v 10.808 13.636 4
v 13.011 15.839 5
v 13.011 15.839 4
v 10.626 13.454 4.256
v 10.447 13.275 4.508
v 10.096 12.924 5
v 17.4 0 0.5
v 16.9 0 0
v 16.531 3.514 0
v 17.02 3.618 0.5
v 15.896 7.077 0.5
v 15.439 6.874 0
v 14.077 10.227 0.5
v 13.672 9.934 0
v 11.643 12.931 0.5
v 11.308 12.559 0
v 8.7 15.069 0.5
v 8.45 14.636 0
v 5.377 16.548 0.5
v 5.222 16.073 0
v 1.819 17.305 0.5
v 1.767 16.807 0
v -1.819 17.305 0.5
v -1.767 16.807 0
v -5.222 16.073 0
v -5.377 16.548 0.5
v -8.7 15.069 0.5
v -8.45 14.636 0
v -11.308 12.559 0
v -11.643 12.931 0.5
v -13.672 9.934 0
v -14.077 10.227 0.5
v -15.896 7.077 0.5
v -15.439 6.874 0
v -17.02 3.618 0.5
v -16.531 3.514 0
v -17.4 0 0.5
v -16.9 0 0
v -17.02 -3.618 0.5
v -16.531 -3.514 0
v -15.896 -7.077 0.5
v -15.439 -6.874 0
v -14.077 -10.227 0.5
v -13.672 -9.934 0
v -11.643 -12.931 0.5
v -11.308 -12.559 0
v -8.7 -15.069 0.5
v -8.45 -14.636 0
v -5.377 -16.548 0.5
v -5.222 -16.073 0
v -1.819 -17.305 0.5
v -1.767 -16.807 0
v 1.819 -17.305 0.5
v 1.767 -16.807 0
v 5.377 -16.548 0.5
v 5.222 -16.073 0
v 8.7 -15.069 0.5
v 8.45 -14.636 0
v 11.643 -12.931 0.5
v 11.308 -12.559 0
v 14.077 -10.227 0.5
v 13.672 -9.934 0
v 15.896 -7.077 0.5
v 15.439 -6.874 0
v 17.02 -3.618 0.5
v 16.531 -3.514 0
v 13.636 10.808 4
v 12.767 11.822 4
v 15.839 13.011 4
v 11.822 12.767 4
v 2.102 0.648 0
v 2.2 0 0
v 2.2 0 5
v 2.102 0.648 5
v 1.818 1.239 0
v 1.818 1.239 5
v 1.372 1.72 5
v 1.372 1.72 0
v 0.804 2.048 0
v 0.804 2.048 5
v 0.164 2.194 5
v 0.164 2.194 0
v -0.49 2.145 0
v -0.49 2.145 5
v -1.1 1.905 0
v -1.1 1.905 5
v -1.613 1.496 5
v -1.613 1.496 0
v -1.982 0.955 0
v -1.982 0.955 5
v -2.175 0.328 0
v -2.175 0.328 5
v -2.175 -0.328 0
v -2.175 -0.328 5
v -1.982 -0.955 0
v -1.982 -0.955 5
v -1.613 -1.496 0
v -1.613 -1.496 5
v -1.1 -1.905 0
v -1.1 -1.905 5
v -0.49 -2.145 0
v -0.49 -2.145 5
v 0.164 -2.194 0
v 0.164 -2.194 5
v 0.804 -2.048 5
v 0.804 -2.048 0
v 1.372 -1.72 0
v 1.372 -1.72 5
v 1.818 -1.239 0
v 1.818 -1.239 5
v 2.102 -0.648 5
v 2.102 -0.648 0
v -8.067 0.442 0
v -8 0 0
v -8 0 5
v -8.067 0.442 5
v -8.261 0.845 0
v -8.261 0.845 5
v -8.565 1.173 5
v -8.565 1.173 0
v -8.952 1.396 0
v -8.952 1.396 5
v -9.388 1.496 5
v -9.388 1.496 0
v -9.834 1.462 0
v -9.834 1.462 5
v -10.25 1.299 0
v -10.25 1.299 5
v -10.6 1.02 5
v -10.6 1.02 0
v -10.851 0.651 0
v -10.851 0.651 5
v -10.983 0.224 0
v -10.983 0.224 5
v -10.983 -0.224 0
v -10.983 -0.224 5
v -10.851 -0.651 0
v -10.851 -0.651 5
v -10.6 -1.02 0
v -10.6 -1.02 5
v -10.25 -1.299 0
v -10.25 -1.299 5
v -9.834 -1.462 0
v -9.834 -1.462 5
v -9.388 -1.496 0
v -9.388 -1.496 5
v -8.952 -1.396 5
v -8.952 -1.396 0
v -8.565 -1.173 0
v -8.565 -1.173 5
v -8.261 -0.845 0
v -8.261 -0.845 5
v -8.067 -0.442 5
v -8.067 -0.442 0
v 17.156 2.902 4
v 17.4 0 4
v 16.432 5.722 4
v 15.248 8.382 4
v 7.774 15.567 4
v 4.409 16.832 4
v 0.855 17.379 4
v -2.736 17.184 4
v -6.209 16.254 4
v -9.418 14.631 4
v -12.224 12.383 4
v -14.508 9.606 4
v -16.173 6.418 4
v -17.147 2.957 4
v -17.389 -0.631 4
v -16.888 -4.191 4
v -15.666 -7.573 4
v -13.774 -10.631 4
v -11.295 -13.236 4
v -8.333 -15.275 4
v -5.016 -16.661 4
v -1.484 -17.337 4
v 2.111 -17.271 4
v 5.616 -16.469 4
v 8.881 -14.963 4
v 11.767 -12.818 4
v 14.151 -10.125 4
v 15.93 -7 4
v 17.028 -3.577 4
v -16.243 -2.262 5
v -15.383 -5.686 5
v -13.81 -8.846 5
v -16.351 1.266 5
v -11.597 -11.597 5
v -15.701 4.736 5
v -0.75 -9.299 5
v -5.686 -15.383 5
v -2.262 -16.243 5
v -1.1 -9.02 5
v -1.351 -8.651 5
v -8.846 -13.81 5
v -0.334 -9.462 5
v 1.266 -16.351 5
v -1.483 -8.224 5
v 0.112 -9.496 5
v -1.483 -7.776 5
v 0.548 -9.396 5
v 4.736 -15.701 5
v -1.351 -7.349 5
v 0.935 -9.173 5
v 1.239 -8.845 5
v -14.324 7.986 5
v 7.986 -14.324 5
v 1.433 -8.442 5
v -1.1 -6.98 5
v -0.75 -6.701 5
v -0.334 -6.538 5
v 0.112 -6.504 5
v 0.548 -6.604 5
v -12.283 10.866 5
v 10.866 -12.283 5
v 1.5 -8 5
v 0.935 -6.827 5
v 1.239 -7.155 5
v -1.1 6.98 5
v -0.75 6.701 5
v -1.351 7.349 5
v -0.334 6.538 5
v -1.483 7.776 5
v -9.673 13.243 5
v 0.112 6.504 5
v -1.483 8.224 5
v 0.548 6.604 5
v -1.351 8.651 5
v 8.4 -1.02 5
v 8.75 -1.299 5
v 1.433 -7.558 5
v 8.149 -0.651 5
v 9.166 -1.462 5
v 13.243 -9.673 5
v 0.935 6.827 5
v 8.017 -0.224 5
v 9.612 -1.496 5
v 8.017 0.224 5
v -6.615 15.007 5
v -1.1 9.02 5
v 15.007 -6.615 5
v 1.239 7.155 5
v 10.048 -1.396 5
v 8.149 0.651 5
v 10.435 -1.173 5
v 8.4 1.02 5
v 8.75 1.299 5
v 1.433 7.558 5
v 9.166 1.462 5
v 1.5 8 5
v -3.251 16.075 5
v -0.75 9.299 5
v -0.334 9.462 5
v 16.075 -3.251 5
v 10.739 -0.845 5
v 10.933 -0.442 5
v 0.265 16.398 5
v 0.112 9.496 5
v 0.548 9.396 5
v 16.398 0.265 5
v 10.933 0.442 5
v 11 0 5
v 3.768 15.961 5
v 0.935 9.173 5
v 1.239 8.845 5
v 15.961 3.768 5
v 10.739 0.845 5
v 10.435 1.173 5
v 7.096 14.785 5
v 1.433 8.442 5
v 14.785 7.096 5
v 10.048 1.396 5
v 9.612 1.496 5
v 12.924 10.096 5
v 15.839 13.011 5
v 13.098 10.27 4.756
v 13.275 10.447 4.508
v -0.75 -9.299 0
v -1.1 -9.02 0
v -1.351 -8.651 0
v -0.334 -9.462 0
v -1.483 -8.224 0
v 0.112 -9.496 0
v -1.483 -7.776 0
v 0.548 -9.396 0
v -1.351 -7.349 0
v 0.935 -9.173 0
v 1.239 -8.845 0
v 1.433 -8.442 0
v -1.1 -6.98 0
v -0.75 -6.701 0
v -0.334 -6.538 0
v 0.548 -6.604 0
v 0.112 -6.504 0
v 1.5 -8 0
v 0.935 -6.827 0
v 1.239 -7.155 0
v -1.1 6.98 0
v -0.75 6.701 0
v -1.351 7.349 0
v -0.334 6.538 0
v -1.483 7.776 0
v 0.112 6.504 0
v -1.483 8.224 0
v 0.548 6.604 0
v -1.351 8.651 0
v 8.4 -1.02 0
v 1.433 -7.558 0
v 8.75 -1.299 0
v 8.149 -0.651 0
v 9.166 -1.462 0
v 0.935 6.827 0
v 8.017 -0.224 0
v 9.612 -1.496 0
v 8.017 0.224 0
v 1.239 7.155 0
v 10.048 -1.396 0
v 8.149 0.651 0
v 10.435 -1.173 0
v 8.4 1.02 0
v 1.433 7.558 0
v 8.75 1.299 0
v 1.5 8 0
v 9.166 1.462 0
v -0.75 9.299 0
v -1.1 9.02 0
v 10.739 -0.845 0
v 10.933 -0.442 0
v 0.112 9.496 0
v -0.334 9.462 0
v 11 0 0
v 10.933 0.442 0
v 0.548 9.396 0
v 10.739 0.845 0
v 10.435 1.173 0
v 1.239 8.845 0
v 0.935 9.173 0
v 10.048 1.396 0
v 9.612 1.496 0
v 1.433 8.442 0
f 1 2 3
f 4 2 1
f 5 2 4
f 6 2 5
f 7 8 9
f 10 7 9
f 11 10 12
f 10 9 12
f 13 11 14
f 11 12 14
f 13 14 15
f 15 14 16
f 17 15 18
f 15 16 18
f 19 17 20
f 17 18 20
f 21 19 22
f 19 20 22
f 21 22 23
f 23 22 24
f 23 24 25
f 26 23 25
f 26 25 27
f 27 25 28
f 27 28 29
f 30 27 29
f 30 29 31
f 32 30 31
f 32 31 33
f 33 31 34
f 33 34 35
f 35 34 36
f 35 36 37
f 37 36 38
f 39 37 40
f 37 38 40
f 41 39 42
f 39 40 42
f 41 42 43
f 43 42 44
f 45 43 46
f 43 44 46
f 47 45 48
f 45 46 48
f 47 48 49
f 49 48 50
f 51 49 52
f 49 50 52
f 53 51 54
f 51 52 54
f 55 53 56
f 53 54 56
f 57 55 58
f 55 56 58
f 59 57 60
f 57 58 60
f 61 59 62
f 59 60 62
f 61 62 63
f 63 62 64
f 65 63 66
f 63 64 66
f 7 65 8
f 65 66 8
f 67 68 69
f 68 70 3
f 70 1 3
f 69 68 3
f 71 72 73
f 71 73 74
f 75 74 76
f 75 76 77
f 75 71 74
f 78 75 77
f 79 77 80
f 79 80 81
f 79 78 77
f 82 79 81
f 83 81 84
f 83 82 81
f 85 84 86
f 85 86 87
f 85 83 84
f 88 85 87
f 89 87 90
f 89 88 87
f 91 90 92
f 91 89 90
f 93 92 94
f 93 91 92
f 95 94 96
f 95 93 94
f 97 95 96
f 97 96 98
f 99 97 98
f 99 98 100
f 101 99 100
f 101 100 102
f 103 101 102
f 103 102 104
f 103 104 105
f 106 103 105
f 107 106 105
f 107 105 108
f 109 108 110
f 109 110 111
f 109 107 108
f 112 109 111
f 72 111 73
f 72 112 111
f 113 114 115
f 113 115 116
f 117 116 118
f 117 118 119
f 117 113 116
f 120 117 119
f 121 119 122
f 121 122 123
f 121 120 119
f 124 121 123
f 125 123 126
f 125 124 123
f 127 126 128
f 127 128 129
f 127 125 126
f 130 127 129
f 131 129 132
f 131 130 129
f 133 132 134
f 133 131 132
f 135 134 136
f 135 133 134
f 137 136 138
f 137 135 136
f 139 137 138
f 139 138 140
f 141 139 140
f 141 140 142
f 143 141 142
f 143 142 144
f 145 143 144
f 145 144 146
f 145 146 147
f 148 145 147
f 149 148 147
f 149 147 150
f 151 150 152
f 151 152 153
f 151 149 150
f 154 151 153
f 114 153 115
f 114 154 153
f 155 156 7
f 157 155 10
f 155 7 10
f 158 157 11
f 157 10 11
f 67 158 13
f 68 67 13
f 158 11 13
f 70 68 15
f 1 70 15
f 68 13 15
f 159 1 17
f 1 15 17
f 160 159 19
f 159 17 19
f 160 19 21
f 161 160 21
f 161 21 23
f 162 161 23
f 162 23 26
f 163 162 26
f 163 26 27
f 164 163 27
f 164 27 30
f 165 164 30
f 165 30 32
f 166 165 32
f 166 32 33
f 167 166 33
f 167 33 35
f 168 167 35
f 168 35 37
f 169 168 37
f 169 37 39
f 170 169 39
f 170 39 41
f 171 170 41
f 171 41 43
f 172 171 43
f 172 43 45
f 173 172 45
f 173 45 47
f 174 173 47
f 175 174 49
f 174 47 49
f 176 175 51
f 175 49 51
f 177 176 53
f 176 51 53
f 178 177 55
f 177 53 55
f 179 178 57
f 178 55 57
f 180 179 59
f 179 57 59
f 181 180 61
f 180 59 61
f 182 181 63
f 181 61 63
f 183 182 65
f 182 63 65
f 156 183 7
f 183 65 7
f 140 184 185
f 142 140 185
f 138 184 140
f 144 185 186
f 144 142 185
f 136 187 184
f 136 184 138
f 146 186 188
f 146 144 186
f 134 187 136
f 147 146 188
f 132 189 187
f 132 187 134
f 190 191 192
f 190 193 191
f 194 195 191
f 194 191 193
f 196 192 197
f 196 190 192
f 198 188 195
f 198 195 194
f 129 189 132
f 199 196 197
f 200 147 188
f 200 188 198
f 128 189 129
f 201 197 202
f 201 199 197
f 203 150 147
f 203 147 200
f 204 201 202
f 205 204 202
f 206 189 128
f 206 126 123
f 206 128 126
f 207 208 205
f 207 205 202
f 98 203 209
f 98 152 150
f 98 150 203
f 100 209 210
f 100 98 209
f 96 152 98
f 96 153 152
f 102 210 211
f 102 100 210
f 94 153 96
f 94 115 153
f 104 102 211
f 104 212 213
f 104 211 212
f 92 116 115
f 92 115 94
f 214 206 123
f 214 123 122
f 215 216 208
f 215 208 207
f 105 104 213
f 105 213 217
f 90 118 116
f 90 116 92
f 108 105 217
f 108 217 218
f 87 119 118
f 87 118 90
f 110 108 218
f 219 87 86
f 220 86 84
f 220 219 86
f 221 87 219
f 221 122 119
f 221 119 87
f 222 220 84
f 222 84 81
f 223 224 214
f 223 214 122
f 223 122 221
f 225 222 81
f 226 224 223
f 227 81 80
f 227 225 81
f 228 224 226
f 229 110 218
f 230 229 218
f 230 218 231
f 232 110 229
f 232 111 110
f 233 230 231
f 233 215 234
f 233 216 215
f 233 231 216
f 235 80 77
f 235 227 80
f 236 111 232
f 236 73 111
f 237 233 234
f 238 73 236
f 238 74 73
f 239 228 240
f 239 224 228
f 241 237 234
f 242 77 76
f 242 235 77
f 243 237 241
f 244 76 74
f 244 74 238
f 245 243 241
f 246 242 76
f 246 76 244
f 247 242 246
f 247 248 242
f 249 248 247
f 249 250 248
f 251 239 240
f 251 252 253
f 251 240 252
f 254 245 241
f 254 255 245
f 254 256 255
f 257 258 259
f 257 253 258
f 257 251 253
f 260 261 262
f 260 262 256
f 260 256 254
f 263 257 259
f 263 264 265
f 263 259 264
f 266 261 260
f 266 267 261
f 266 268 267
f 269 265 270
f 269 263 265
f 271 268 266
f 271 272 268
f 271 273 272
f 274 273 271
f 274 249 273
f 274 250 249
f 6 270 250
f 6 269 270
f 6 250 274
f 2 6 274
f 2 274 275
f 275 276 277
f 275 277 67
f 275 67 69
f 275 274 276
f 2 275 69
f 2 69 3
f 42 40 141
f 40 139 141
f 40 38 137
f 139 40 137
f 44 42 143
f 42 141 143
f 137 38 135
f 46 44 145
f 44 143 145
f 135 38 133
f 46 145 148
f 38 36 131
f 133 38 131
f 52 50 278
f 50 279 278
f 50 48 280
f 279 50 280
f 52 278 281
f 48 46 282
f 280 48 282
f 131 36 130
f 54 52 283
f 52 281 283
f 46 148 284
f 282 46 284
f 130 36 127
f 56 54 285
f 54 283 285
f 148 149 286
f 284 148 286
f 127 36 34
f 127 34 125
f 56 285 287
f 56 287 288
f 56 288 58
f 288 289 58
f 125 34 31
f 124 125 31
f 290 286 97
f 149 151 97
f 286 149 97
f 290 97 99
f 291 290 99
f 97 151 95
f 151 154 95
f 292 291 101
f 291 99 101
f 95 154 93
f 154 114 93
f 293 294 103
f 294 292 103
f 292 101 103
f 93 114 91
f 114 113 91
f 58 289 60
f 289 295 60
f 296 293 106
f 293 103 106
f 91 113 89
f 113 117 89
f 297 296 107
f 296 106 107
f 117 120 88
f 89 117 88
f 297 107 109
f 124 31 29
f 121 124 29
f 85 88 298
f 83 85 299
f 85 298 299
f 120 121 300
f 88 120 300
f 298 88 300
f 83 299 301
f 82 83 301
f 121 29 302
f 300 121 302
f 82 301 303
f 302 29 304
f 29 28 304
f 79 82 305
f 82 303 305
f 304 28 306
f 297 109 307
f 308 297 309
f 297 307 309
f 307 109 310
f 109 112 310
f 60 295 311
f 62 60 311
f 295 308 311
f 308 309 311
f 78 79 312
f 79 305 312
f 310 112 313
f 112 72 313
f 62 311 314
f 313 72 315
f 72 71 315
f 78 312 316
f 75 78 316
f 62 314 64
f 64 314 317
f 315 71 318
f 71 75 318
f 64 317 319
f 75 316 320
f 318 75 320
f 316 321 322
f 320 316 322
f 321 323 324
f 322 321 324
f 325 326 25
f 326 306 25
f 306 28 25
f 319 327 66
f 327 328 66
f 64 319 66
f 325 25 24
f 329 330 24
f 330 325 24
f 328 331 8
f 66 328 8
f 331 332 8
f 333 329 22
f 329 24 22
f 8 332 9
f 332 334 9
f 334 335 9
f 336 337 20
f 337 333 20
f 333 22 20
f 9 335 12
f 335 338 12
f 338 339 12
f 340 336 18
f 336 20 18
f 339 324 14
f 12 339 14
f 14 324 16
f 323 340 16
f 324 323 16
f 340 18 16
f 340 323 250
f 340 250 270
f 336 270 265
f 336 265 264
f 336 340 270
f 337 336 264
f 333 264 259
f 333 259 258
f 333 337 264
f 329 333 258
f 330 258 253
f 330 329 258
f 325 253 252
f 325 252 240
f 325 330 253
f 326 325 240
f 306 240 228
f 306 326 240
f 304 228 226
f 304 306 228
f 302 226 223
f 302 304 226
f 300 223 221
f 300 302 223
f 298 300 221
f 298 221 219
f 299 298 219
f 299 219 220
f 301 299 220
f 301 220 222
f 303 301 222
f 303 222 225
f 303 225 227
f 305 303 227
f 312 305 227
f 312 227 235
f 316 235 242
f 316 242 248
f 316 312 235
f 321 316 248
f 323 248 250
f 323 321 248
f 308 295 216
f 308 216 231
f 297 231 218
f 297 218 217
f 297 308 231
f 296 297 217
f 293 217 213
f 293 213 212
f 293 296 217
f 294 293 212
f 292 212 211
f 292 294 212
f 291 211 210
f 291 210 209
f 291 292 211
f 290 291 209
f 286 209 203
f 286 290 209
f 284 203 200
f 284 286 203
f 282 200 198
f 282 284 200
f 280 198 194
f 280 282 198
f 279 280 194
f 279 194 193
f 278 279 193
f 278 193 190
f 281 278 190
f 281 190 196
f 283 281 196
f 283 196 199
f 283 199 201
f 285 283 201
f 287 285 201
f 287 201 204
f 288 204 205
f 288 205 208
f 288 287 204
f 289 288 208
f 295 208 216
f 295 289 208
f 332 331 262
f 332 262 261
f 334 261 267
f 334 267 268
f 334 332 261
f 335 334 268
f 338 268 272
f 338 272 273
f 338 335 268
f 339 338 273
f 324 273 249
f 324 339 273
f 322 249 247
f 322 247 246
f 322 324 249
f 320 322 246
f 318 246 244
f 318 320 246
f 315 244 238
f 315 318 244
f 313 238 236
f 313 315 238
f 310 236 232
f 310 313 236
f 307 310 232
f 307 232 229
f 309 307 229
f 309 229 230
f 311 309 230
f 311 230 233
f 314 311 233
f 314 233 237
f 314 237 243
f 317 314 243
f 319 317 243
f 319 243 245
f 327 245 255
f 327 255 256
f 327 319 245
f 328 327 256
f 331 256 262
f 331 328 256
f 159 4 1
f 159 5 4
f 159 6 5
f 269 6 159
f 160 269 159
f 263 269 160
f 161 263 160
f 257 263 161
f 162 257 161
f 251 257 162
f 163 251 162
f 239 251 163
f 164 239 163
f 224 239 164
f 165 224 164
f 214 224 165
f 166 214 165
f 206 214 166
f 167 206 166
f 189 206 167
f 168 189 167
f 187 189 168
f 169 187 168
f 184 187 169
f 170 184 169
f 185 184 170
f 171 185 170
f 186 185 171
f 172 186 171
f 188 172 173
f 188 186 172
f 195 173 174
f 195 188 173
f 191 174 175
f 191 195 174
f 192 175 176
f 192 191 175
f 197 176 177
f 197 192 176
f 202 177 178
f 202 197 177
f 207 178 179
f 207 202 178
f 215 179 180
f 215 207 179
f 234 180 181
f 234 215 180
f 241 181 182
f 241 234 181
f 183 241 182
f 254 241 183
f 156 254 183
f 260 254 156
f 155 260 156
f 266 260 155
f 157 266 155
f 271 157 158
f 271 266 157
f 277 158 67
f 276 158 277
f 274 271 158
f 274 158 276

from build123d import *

# Parameters (mm, degrees)
F0_R     = 17.4
F0_R_2   = 1.5
F0_R_3   = 2.2
F1_DEPTH = 5
F2_SIZE  = 1
F3_SIZE  = 0.5
F5_DEPTH = 1


with BuildPart() as f1:
    # F0 (on Top) → F1 (new body)
    with BuildSketch(Plane.XY):
        Circle(F0_R)
        with Locations((0, -8)):
            Circle(F0_R_2, mode=Mode.SUBTRACT)
        with Locations((-9.5, 0)):
            Circle(F0_R_2, mode=Mode.SUBTRACT)
        Circle(F0_R_3, mode=Mode.SUBTRACT)
        with Locations((0, 8)):
            Circle(F0_R_2, mode=Mode.SUBTRACT)
        with Locations((9.5, 0)):
            Circle(F0_R_2, mode=Mode.SUBTRACT)
    extrude(amount=F1_DEPTH)

    # F2
    f2_edges = [f1.edges().sort_by_distance(p)[0] for p in [
        (-17.4, 0, 5),
    ]]
    chamfer(f2_edges, length=F2_SIZE)

    # F3
    f3_edges = [f1.edges().sort_by_distance(p)[0] for p in [
        (-17.4, 0, 0),
    ]]
    chamfer(f3_edges, length=F3_SIZE)

    # F4 (on face) → F5 (join)
    with BuildSketch(Plane.XY.offset(5)):
        Polygon((13.010765, 15.839192), (9.828784, 12.657211), (12.657211, 9.828784), (15.839192, 13.010765), align=None)
    extrude(amount=-F5_DEPTH)


solid = f1.part
